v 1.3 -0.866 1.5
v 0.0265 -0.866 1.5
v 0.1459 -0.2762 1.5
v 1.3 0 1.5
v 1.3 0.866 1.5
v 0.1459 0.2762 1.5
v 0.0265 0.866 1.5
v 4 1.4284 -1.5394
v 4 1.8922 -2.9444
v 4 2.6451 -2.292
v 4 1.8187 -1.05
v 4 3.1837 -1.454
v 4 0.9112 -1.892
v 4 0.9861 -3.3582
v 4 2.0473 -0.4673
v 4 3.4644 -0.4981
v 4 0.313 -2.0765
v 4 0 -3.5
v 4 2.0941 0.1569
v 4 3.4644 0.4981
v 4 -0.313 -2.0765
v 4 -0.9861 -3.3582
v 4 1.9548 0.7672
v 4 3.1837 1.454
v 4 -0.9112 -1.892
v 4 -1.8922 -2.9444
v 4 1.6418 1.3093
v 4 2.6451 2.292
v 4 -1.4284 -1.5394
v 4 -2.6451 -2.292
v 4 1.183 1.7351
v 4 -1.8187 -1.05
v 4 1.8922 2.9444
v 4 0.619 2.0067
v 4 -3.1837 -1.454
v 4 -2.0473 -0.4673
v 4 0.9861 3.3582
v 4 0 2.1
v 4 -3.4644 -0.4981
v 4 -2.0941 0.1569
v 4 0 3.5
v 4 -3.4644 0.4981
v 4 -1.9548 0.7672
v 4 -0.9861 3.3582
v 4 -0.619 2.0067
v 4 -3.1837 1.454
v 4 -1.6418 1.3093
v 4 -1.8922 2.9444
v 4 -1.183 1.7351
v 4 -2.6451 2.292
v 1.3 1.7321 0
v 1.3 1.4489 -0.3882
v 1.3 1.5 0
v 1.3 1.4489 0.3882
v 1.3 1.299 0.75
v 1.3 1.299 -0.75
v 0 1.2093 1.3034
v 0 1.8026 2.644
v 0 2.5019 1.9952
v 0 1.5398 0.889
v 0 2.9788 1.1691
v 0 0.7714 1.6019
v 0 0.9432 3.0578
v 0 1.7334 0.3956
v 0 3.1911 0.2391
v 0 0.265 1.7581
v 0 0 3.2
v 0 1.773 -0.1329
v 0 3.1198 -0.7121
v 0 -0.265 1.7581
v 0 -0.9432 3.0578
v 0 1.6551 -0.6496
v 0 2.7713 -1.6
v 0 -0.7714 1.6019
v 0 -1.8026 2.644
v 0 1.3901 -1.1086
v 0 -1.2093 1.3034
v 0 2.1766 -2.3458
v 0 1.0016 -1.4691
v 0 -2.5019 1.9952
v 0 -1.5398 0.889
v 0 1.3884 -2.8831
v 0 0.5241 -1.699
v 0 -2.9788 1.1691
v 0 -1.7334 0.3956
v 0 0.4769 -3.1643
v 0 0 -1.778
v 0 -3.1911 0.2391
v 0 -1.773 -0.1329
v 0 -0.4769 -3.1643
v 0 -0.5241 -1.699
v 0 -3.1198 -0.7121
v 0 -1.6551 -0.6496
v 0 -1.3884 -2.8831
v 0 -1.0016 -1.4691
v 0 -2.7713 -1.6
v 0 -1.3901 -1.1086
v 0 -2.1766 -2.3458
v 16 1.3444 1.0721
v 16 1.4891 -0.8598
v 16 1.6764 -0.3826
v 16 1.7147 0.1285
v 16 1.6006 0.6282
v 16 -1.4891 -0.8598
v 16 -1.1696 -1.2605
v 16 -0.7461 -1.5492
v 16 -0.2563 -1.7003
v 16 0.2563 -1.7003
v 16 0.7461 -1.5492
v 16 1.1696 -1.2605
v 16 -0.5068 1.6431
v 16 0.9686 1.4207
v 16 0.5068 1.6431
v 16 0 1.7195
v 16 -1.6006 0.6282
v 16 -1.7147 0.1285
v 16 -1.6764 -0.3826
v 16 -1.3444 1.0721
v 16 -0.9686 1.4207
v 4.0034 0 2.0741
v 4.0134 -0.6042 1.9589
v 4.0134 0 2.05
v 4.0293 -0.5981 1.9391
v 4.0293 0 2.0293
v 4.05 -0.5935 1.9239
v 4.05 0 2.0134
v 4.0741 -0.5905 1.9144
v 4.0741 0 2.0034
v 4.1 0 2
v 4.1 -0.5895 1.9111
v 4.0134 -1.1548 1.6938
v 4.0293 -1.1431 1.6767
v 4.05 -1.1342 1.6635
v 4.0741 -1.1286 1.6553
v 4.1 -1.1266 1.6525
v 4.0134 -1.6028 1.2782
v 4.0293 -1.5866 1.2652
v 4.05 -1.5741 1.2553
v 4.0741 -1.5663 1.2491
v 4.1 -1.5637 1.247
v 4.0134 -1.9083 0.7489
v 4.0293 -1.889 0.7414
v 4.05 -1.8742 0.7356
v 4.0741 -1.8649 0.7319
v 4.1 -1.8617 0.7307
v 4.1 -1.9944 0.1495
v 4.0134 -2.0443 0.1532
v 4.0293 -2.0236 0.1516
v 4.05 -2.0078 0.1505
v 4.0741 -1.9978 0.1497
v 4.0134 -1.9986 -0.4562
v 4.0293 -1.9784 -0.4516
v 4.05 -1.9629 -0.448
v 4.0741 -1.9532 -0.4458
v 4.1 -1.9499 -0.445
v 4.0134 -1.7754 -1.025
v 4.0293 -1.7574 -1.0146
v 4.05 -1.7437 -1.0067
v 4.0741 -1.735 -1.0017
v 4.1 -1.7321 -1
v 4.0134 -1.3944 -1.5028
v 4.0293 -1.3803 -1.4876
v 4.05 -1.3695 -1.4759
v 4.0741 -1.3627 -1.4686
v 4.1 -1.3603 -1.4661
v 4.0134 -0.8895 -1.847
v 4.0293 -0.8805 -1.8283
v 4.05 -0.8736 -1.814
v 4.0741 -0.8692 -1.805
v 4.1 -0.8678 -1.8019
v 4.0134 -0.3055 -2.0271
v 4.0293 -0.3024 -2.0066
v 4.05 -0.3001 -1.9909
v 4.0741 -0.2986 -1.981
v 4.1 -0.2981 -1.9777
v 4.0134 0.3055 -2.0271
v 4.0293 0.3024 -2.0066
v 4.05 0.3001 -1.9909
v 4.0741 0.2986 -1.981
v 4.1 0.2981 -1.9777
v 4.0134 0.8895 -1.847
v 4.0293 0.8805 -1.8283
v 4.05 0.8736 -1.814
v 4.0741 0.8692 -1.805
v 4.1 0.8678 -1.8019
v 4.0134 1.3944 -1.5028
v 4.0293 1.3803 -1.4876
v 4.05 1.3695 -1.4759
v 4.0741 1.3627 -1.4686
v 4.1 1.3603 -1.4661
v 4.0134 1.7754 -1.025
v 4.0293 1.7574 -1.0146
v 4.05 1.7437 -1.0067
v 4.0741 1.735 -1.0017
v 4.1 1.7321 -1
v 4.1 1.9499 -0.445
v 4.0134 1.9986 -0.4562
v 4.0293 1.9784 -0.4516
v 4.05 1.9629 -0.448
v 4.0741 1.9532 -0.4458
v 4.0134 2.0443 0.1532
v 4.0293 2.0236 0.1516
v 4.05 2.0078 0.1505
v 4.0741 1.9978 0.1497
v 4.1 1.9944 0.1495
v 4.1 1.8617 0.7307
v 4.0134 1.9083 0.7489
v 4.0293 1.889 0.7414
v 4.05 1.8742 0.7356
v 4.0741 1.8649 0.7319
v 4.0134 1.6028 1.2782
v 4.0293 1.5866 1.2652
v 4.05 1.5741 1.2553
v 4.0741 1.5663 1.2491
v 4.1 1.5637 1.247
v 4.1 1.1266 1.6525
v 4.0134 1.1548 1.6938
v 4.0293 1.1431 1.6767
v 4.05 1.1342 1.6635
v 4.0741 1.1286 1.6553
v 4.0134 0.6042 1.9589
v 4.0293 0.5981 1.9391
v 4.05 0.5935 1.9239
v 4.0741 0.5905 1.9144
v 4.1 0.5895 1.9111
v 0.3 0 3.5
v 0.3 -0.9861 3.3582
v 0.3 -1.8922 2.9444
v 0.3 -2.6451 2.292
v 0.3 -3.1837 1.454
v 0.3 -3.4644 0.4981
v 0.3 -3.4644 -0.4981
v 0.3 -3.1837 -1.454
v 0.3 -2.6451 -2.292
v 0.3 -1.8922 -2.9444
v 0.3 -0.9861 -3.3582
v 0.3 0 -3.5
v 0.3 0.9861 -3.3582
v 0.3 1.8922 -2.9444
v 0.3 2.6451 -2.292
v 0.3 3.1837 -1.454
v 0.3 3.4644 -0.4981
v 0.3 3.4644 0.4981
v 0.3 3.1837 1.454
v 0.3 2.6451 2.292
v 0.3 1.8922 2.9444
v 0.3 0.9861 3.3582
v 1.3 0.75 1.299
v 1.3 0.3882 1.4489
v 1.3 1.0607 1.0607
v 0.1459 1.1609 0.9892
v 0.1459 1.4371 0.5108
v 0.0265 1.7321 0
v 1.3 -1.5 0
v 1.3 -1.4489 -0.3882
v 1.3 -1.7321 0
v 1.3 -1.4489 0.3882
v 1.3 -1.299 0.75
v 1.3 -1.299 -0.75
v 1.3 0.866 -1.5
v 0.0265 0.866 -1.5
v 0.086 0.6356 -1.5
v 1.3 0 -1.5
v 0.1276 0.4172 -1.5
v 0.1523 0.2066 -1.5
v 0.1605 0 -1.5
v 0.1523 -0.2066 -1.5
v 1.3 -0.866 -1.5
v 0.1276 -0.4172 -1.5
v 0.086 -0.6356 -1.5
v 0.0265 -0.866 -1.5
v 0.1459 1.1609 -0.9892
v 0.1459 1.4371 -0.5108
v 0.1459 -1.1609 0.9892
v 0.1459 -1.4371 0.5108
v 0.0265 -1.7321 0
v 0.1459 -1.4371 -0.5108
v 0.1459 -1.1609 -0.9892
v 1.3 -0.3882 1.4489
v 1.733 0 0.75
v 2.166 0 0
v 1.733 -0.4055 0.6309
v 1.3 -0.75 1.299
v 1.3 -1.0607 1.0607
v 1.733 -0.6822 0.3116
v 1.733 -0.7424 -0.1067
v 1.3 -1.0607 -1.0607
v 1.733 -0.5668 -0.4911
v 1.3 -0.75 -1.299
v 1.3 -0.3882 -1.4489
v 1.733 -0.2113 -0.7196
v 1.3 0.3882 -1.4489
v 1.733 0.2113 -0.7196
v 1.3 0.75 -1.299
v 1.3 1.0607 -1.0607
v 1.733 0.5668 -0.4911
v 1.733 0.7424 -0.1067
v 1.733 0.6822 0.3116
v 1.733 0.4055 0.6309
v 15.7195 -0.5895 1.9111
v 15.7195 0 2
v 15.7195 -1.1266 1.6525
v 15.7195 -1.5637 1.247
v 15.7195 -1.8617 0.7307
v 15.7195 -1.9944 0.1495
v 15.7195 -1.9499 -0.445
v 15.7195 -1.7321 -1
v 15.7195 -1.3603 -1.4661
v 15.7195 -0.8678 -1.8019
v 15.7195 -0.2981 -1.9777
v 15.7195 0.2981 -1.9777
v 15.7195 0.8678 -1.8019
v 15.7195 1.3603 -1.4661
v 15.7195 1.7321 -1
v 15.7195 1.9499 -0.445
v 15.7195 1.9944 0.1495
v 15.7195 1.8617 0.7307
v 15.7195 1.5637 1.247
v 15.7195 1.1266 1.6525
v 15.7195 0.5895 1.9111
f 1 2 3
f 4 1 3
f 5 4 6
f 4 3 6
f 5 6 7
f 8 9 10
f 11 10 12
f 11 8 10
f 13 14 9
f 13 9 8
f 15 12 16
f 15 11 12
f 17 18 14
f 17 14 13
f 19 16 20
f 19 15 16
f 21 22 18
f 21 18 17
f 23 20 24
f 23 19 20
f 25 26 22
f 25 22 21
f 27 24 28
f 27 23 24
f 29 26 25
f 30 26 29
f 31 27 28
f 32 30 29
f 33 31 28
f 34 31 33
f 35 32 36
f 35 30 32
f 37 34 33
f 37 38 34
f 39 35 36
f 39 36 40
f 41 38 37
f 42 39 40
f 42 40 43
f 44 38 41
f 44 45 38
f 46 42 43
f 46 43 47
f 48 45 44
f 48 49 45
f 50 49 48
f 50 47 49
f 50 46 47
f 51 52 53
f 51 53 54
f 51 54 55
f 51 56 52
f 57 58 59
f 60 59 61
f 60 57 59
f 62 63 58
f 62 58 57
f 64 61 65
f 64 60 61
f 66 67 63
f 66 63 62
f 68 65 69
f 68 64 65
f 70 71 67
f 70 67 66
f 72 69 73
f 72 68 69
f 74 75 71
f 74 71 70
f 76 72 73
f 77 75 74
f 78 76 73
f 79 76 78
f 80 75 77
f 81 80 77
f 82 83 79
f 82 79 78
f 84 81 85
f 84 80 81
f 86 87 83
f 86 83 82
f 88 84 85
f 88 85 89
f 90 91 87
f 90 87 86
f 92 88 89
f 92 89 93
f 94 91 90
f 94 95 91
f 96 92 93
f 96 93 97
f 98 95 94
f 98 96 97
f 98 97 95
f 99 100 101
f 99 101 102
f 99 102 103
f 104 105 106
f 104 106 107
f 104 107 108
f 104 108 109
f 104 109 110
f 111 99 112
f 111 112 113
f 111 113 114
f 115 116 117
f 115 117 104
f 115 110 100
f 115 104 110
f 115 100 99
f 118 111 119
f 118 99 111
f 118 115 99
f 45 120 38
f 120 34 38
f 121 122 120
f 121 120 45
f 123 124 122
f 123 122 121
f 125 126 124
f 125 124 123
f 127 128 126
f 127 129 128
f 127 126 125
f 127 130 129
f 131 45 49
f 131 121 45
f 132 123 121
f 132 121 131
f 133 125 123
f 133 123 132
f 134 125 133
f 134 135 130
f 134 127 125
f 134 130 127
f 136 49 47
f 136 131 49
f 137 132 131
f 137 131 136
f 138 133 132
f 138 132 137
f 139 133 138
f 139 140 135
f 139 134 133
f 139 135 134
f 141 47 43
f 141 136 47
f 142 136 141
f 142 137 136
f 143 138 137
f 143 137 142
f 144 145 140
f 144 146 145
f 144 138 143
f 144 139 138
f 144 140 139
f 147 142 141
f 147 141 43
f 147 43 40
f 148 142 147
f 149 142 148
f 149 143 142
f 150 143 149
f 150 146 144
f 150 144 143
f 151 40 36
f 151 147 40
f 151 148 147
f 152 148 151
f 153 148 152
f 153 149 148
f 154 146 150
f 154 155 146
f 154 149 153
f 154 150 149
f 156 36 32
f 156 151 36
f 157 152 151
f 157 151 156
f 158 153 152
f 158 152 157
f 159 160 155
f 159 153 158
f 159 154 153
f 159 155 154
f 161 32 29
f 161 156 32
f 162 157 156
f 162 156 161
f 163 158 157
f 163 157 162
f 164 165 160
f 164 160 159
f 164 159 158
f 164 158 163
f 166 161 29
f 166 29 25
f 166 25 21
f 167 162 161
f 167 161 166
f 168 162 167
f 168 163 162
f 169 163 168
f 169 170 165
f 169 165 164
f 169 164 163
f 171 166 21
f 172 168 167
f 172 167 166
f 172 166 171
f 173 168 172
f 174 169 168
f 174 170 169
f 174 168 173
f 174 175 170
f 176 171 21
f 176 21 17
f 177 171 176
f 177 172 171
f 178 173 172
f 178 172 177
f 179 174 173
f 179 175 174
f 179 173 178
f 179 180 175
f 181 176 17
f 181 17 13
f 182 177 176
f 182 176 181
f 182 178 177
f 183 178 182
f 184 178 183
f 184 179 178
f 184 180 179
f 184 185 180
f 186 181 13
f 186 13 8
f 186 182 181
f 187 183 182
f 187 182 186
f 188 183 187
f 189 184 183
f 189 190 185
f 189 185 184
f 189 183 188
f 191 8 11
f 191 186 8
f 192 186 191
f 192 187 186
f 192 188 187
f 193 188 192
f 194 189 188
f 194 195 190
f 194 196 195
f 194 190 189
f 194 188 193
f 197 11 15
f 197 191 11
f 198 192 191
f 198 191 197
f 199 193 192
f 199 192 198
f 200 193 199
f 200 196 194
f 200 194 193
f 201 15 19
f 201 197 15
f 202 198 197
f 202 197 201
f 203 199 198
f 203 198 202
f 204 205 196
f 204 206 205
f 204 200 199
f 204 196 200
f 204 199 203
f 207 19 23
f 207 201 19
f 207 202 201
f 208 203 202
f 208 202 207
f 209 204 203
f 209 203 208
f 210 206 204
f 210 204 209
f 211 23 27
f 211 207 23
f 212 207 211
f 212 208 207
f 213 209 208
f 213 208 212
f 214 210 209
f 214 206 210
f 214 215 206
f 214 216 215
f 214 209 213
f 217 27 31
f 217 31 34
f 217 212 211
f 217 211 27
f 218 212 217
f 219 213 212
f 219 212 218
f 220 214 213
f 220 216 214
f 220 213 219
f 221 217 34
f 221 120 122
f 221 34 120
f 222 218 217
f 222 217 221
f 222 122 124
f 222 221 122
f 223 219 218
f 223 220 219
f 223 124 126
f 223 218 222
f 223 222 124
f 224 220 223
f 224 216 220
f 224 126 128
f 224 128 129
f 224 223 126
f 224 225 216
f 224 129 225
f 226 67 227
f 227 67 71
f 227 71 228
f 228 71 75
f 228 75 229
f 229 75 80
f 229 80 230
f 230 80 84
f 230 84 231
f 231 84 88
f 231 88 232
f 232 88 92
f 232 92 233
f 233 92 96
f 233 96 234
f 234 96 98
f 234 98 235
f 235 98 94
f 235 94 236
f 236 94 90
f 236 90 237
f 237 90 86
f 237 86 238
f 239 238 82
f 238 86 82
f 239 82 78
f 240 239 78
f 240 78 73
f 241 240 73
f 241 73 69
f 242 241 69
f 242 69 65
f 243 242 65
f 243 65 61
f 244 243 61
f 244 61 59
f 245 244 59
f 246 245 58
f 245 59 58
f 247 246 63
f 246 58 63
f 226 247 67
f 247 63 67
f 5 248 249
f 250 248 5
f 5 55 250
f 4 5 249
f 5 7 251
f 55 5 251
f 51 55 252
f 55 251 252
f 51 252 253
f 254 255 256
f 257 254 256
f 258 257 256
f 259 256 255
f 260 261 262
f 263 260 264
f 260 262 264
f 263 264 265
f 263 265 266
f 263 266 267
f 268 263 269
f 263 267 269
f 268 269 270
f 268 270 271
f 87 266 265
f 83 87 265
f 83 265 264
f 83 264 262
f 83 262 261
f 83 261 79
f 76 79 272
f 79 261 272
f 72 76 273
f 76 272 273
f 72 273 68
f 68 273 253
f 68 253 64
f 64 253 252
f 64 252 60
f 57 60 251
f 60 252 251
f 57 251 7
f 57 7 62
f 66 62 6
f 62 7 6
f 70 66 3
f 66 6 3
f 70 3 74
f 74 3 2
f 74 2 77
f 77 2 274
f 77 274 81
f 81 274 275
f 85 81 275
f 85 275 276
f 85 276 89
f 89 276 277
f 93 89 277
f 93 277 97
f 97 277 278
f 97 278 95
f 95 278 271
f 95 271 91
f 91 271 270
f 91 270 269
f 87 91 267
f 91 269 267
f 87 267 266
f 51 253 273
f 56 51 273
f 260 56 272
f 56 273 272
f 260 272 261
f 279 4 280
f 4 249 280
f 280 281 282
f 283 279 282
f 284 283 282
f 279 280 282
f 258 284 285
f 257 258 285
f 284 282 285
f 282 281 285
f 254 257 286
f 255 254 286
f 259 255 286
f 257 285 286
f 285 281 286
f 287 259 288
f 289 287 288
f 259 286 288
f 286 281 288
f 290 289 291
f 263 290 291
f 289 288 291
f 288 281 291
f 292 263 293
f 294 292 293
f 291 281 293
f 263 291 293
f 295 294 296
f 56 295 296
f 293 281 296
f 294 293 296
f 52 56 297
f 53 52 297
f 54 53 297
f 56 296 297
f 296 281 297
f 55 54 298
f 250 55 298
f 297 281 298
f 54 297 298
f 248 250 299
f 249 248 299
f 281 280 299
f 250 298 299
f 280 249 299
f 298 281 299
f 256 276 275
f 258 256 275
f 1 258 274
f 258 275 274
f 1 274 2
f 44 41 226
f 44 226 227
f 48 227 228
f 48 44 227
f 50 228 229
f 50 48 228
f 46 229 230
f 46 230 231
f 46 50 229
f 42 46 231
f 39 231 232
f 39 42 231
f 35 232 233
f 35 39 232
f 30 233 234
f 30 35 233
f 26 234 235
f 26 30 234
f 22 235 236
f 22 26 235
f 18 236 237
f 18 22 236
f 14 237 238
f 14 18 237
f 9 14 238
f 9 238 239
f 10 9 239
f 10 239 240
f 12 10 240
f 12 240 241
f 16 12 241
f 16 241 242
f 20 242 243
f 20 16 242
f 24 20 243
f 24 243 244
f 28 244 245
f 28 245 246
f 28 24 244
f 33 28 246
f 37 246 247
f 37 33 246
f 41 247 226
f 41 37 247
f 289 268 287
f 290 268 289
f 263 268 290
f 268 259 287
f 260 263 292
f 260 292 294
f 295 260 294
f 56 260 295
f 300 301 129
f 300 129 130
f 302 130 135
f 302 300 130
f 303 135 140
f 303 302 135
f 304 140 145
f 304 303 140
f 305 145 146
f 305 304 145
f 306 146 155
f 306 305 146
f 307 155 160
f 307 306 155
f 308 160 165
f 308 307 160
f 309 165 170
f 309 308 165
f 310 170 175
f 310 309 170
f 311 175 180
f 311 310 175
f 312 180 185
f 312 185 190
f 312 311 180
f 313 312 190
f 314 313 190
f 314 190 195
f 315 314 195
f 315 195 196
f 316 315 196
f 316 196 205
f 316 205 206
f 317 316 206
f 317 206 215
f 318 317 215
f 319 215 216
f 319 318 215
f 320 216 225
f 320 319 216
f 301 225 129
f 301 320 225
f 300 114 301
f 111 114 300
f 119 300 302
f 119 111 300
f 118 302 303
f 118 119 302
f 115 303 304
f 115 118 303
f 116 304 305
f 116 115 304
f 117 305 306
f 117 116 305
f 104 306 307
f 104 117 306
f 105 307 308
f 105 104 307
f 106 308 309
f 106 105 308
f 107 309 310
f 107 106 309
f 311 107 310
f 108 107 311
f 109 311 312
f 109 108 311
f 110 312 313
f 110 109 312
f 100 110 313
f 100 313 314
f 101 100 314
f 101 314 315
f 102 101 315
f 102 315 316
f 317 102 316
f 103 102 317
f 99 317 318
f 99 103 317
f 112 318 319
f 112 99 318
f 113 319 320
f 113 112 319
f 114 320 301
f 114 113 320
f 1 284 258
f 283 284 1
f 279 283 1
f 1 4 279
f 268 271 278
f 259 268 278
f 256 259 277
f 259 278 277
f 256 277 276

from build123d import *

# Parameters (mm, degrees)
FILLET1_R     = 0.1
HEX_2_DEPTH   = 1.3
CHAMFER1_SIZE = 0.3


with BuildPart() as part:
    # BodySke → Base-Revolve (revolve)
    with BuildSketch(Plane.XY, mode=Mode.PRIVATE) as base_revolve_sk:
        Polygon((0, 0), (0, 3.5), (4, 3.5), (4, 2), (15.7195, 2), (16, 1.7195), (16, 0), align=None)
    revolve(base_revolve_sk.sketch.rotate(Axis((-31.75, 0, 0), (1, 0, 0)), 90), axis=Axis((-31.75, 0, 0), (1, 0, 0)))

    # Fillet1
    fillet1_edges = [part.edges().sort_by_distance(p)[0] for p in [
        (4, 0, -2),
    ]]
    fillet(fillet1_edges, radius=FILLET1_R)

    # Sketch2 → Hex-PreBroach (revolve, cut)
    with BuildSketch(Plane.XY, mode=Mode.PRIVATE) as hex_prebroach_sk:
        Polygon((0, 1.5), (1.3, 1.5), (2.166025404, 0), (0, 0), align=None)
    revolve(hex_prebroach_sk.sketch.rotate(Axis((0, 0, 0), (1, 0, 0)), 90), axis=Axis((0, 0, 0), (1, 0, 0)), mode=Mode.SUBTRACT)

    # Sketch3 → Hex 2 (cut)
    with BuildSketch(Plane(origin=(0, 0, 0), x_dir=(0, 0.500000000000001, 0.866025403784438), z_dir=(-1, 0, 0))):
        Polygon((0.866025404, 1.5), (-0.866025404, 1.5), (-1.732050808, 0), (-0.866025404, -1.5), (0.866025404, -1.5), (1.732050808, 0), align=None)
    extrude(amount=-HEX_2_DEPTH, mode=Mode.SUBTRACT)

    # Chamfer1
    chamfer1_edges = [part.edges().sort_by_distance(p)[0] for p in [
        (0, 0, -3.5),
    ]]
    chamfer(chamfer1_edges, length=CHAMFER1_SIZE)

    # Sketch4 → Cut-Revolve1 (revolve, cut)
    with BuildSketch(Plane(origin=(0, 0, 0), x_dir=(1, 0, 0), z_dir=(0, 1, 0))):
        Polygon((0, 1.778), (1.026528779, 0), (0, 0), align=None)
    revolve(axis=Axis((1.026528779, 0, 0), (1, 0, 0)), mode=Mode.SUBTRACT)


solid = part.part
